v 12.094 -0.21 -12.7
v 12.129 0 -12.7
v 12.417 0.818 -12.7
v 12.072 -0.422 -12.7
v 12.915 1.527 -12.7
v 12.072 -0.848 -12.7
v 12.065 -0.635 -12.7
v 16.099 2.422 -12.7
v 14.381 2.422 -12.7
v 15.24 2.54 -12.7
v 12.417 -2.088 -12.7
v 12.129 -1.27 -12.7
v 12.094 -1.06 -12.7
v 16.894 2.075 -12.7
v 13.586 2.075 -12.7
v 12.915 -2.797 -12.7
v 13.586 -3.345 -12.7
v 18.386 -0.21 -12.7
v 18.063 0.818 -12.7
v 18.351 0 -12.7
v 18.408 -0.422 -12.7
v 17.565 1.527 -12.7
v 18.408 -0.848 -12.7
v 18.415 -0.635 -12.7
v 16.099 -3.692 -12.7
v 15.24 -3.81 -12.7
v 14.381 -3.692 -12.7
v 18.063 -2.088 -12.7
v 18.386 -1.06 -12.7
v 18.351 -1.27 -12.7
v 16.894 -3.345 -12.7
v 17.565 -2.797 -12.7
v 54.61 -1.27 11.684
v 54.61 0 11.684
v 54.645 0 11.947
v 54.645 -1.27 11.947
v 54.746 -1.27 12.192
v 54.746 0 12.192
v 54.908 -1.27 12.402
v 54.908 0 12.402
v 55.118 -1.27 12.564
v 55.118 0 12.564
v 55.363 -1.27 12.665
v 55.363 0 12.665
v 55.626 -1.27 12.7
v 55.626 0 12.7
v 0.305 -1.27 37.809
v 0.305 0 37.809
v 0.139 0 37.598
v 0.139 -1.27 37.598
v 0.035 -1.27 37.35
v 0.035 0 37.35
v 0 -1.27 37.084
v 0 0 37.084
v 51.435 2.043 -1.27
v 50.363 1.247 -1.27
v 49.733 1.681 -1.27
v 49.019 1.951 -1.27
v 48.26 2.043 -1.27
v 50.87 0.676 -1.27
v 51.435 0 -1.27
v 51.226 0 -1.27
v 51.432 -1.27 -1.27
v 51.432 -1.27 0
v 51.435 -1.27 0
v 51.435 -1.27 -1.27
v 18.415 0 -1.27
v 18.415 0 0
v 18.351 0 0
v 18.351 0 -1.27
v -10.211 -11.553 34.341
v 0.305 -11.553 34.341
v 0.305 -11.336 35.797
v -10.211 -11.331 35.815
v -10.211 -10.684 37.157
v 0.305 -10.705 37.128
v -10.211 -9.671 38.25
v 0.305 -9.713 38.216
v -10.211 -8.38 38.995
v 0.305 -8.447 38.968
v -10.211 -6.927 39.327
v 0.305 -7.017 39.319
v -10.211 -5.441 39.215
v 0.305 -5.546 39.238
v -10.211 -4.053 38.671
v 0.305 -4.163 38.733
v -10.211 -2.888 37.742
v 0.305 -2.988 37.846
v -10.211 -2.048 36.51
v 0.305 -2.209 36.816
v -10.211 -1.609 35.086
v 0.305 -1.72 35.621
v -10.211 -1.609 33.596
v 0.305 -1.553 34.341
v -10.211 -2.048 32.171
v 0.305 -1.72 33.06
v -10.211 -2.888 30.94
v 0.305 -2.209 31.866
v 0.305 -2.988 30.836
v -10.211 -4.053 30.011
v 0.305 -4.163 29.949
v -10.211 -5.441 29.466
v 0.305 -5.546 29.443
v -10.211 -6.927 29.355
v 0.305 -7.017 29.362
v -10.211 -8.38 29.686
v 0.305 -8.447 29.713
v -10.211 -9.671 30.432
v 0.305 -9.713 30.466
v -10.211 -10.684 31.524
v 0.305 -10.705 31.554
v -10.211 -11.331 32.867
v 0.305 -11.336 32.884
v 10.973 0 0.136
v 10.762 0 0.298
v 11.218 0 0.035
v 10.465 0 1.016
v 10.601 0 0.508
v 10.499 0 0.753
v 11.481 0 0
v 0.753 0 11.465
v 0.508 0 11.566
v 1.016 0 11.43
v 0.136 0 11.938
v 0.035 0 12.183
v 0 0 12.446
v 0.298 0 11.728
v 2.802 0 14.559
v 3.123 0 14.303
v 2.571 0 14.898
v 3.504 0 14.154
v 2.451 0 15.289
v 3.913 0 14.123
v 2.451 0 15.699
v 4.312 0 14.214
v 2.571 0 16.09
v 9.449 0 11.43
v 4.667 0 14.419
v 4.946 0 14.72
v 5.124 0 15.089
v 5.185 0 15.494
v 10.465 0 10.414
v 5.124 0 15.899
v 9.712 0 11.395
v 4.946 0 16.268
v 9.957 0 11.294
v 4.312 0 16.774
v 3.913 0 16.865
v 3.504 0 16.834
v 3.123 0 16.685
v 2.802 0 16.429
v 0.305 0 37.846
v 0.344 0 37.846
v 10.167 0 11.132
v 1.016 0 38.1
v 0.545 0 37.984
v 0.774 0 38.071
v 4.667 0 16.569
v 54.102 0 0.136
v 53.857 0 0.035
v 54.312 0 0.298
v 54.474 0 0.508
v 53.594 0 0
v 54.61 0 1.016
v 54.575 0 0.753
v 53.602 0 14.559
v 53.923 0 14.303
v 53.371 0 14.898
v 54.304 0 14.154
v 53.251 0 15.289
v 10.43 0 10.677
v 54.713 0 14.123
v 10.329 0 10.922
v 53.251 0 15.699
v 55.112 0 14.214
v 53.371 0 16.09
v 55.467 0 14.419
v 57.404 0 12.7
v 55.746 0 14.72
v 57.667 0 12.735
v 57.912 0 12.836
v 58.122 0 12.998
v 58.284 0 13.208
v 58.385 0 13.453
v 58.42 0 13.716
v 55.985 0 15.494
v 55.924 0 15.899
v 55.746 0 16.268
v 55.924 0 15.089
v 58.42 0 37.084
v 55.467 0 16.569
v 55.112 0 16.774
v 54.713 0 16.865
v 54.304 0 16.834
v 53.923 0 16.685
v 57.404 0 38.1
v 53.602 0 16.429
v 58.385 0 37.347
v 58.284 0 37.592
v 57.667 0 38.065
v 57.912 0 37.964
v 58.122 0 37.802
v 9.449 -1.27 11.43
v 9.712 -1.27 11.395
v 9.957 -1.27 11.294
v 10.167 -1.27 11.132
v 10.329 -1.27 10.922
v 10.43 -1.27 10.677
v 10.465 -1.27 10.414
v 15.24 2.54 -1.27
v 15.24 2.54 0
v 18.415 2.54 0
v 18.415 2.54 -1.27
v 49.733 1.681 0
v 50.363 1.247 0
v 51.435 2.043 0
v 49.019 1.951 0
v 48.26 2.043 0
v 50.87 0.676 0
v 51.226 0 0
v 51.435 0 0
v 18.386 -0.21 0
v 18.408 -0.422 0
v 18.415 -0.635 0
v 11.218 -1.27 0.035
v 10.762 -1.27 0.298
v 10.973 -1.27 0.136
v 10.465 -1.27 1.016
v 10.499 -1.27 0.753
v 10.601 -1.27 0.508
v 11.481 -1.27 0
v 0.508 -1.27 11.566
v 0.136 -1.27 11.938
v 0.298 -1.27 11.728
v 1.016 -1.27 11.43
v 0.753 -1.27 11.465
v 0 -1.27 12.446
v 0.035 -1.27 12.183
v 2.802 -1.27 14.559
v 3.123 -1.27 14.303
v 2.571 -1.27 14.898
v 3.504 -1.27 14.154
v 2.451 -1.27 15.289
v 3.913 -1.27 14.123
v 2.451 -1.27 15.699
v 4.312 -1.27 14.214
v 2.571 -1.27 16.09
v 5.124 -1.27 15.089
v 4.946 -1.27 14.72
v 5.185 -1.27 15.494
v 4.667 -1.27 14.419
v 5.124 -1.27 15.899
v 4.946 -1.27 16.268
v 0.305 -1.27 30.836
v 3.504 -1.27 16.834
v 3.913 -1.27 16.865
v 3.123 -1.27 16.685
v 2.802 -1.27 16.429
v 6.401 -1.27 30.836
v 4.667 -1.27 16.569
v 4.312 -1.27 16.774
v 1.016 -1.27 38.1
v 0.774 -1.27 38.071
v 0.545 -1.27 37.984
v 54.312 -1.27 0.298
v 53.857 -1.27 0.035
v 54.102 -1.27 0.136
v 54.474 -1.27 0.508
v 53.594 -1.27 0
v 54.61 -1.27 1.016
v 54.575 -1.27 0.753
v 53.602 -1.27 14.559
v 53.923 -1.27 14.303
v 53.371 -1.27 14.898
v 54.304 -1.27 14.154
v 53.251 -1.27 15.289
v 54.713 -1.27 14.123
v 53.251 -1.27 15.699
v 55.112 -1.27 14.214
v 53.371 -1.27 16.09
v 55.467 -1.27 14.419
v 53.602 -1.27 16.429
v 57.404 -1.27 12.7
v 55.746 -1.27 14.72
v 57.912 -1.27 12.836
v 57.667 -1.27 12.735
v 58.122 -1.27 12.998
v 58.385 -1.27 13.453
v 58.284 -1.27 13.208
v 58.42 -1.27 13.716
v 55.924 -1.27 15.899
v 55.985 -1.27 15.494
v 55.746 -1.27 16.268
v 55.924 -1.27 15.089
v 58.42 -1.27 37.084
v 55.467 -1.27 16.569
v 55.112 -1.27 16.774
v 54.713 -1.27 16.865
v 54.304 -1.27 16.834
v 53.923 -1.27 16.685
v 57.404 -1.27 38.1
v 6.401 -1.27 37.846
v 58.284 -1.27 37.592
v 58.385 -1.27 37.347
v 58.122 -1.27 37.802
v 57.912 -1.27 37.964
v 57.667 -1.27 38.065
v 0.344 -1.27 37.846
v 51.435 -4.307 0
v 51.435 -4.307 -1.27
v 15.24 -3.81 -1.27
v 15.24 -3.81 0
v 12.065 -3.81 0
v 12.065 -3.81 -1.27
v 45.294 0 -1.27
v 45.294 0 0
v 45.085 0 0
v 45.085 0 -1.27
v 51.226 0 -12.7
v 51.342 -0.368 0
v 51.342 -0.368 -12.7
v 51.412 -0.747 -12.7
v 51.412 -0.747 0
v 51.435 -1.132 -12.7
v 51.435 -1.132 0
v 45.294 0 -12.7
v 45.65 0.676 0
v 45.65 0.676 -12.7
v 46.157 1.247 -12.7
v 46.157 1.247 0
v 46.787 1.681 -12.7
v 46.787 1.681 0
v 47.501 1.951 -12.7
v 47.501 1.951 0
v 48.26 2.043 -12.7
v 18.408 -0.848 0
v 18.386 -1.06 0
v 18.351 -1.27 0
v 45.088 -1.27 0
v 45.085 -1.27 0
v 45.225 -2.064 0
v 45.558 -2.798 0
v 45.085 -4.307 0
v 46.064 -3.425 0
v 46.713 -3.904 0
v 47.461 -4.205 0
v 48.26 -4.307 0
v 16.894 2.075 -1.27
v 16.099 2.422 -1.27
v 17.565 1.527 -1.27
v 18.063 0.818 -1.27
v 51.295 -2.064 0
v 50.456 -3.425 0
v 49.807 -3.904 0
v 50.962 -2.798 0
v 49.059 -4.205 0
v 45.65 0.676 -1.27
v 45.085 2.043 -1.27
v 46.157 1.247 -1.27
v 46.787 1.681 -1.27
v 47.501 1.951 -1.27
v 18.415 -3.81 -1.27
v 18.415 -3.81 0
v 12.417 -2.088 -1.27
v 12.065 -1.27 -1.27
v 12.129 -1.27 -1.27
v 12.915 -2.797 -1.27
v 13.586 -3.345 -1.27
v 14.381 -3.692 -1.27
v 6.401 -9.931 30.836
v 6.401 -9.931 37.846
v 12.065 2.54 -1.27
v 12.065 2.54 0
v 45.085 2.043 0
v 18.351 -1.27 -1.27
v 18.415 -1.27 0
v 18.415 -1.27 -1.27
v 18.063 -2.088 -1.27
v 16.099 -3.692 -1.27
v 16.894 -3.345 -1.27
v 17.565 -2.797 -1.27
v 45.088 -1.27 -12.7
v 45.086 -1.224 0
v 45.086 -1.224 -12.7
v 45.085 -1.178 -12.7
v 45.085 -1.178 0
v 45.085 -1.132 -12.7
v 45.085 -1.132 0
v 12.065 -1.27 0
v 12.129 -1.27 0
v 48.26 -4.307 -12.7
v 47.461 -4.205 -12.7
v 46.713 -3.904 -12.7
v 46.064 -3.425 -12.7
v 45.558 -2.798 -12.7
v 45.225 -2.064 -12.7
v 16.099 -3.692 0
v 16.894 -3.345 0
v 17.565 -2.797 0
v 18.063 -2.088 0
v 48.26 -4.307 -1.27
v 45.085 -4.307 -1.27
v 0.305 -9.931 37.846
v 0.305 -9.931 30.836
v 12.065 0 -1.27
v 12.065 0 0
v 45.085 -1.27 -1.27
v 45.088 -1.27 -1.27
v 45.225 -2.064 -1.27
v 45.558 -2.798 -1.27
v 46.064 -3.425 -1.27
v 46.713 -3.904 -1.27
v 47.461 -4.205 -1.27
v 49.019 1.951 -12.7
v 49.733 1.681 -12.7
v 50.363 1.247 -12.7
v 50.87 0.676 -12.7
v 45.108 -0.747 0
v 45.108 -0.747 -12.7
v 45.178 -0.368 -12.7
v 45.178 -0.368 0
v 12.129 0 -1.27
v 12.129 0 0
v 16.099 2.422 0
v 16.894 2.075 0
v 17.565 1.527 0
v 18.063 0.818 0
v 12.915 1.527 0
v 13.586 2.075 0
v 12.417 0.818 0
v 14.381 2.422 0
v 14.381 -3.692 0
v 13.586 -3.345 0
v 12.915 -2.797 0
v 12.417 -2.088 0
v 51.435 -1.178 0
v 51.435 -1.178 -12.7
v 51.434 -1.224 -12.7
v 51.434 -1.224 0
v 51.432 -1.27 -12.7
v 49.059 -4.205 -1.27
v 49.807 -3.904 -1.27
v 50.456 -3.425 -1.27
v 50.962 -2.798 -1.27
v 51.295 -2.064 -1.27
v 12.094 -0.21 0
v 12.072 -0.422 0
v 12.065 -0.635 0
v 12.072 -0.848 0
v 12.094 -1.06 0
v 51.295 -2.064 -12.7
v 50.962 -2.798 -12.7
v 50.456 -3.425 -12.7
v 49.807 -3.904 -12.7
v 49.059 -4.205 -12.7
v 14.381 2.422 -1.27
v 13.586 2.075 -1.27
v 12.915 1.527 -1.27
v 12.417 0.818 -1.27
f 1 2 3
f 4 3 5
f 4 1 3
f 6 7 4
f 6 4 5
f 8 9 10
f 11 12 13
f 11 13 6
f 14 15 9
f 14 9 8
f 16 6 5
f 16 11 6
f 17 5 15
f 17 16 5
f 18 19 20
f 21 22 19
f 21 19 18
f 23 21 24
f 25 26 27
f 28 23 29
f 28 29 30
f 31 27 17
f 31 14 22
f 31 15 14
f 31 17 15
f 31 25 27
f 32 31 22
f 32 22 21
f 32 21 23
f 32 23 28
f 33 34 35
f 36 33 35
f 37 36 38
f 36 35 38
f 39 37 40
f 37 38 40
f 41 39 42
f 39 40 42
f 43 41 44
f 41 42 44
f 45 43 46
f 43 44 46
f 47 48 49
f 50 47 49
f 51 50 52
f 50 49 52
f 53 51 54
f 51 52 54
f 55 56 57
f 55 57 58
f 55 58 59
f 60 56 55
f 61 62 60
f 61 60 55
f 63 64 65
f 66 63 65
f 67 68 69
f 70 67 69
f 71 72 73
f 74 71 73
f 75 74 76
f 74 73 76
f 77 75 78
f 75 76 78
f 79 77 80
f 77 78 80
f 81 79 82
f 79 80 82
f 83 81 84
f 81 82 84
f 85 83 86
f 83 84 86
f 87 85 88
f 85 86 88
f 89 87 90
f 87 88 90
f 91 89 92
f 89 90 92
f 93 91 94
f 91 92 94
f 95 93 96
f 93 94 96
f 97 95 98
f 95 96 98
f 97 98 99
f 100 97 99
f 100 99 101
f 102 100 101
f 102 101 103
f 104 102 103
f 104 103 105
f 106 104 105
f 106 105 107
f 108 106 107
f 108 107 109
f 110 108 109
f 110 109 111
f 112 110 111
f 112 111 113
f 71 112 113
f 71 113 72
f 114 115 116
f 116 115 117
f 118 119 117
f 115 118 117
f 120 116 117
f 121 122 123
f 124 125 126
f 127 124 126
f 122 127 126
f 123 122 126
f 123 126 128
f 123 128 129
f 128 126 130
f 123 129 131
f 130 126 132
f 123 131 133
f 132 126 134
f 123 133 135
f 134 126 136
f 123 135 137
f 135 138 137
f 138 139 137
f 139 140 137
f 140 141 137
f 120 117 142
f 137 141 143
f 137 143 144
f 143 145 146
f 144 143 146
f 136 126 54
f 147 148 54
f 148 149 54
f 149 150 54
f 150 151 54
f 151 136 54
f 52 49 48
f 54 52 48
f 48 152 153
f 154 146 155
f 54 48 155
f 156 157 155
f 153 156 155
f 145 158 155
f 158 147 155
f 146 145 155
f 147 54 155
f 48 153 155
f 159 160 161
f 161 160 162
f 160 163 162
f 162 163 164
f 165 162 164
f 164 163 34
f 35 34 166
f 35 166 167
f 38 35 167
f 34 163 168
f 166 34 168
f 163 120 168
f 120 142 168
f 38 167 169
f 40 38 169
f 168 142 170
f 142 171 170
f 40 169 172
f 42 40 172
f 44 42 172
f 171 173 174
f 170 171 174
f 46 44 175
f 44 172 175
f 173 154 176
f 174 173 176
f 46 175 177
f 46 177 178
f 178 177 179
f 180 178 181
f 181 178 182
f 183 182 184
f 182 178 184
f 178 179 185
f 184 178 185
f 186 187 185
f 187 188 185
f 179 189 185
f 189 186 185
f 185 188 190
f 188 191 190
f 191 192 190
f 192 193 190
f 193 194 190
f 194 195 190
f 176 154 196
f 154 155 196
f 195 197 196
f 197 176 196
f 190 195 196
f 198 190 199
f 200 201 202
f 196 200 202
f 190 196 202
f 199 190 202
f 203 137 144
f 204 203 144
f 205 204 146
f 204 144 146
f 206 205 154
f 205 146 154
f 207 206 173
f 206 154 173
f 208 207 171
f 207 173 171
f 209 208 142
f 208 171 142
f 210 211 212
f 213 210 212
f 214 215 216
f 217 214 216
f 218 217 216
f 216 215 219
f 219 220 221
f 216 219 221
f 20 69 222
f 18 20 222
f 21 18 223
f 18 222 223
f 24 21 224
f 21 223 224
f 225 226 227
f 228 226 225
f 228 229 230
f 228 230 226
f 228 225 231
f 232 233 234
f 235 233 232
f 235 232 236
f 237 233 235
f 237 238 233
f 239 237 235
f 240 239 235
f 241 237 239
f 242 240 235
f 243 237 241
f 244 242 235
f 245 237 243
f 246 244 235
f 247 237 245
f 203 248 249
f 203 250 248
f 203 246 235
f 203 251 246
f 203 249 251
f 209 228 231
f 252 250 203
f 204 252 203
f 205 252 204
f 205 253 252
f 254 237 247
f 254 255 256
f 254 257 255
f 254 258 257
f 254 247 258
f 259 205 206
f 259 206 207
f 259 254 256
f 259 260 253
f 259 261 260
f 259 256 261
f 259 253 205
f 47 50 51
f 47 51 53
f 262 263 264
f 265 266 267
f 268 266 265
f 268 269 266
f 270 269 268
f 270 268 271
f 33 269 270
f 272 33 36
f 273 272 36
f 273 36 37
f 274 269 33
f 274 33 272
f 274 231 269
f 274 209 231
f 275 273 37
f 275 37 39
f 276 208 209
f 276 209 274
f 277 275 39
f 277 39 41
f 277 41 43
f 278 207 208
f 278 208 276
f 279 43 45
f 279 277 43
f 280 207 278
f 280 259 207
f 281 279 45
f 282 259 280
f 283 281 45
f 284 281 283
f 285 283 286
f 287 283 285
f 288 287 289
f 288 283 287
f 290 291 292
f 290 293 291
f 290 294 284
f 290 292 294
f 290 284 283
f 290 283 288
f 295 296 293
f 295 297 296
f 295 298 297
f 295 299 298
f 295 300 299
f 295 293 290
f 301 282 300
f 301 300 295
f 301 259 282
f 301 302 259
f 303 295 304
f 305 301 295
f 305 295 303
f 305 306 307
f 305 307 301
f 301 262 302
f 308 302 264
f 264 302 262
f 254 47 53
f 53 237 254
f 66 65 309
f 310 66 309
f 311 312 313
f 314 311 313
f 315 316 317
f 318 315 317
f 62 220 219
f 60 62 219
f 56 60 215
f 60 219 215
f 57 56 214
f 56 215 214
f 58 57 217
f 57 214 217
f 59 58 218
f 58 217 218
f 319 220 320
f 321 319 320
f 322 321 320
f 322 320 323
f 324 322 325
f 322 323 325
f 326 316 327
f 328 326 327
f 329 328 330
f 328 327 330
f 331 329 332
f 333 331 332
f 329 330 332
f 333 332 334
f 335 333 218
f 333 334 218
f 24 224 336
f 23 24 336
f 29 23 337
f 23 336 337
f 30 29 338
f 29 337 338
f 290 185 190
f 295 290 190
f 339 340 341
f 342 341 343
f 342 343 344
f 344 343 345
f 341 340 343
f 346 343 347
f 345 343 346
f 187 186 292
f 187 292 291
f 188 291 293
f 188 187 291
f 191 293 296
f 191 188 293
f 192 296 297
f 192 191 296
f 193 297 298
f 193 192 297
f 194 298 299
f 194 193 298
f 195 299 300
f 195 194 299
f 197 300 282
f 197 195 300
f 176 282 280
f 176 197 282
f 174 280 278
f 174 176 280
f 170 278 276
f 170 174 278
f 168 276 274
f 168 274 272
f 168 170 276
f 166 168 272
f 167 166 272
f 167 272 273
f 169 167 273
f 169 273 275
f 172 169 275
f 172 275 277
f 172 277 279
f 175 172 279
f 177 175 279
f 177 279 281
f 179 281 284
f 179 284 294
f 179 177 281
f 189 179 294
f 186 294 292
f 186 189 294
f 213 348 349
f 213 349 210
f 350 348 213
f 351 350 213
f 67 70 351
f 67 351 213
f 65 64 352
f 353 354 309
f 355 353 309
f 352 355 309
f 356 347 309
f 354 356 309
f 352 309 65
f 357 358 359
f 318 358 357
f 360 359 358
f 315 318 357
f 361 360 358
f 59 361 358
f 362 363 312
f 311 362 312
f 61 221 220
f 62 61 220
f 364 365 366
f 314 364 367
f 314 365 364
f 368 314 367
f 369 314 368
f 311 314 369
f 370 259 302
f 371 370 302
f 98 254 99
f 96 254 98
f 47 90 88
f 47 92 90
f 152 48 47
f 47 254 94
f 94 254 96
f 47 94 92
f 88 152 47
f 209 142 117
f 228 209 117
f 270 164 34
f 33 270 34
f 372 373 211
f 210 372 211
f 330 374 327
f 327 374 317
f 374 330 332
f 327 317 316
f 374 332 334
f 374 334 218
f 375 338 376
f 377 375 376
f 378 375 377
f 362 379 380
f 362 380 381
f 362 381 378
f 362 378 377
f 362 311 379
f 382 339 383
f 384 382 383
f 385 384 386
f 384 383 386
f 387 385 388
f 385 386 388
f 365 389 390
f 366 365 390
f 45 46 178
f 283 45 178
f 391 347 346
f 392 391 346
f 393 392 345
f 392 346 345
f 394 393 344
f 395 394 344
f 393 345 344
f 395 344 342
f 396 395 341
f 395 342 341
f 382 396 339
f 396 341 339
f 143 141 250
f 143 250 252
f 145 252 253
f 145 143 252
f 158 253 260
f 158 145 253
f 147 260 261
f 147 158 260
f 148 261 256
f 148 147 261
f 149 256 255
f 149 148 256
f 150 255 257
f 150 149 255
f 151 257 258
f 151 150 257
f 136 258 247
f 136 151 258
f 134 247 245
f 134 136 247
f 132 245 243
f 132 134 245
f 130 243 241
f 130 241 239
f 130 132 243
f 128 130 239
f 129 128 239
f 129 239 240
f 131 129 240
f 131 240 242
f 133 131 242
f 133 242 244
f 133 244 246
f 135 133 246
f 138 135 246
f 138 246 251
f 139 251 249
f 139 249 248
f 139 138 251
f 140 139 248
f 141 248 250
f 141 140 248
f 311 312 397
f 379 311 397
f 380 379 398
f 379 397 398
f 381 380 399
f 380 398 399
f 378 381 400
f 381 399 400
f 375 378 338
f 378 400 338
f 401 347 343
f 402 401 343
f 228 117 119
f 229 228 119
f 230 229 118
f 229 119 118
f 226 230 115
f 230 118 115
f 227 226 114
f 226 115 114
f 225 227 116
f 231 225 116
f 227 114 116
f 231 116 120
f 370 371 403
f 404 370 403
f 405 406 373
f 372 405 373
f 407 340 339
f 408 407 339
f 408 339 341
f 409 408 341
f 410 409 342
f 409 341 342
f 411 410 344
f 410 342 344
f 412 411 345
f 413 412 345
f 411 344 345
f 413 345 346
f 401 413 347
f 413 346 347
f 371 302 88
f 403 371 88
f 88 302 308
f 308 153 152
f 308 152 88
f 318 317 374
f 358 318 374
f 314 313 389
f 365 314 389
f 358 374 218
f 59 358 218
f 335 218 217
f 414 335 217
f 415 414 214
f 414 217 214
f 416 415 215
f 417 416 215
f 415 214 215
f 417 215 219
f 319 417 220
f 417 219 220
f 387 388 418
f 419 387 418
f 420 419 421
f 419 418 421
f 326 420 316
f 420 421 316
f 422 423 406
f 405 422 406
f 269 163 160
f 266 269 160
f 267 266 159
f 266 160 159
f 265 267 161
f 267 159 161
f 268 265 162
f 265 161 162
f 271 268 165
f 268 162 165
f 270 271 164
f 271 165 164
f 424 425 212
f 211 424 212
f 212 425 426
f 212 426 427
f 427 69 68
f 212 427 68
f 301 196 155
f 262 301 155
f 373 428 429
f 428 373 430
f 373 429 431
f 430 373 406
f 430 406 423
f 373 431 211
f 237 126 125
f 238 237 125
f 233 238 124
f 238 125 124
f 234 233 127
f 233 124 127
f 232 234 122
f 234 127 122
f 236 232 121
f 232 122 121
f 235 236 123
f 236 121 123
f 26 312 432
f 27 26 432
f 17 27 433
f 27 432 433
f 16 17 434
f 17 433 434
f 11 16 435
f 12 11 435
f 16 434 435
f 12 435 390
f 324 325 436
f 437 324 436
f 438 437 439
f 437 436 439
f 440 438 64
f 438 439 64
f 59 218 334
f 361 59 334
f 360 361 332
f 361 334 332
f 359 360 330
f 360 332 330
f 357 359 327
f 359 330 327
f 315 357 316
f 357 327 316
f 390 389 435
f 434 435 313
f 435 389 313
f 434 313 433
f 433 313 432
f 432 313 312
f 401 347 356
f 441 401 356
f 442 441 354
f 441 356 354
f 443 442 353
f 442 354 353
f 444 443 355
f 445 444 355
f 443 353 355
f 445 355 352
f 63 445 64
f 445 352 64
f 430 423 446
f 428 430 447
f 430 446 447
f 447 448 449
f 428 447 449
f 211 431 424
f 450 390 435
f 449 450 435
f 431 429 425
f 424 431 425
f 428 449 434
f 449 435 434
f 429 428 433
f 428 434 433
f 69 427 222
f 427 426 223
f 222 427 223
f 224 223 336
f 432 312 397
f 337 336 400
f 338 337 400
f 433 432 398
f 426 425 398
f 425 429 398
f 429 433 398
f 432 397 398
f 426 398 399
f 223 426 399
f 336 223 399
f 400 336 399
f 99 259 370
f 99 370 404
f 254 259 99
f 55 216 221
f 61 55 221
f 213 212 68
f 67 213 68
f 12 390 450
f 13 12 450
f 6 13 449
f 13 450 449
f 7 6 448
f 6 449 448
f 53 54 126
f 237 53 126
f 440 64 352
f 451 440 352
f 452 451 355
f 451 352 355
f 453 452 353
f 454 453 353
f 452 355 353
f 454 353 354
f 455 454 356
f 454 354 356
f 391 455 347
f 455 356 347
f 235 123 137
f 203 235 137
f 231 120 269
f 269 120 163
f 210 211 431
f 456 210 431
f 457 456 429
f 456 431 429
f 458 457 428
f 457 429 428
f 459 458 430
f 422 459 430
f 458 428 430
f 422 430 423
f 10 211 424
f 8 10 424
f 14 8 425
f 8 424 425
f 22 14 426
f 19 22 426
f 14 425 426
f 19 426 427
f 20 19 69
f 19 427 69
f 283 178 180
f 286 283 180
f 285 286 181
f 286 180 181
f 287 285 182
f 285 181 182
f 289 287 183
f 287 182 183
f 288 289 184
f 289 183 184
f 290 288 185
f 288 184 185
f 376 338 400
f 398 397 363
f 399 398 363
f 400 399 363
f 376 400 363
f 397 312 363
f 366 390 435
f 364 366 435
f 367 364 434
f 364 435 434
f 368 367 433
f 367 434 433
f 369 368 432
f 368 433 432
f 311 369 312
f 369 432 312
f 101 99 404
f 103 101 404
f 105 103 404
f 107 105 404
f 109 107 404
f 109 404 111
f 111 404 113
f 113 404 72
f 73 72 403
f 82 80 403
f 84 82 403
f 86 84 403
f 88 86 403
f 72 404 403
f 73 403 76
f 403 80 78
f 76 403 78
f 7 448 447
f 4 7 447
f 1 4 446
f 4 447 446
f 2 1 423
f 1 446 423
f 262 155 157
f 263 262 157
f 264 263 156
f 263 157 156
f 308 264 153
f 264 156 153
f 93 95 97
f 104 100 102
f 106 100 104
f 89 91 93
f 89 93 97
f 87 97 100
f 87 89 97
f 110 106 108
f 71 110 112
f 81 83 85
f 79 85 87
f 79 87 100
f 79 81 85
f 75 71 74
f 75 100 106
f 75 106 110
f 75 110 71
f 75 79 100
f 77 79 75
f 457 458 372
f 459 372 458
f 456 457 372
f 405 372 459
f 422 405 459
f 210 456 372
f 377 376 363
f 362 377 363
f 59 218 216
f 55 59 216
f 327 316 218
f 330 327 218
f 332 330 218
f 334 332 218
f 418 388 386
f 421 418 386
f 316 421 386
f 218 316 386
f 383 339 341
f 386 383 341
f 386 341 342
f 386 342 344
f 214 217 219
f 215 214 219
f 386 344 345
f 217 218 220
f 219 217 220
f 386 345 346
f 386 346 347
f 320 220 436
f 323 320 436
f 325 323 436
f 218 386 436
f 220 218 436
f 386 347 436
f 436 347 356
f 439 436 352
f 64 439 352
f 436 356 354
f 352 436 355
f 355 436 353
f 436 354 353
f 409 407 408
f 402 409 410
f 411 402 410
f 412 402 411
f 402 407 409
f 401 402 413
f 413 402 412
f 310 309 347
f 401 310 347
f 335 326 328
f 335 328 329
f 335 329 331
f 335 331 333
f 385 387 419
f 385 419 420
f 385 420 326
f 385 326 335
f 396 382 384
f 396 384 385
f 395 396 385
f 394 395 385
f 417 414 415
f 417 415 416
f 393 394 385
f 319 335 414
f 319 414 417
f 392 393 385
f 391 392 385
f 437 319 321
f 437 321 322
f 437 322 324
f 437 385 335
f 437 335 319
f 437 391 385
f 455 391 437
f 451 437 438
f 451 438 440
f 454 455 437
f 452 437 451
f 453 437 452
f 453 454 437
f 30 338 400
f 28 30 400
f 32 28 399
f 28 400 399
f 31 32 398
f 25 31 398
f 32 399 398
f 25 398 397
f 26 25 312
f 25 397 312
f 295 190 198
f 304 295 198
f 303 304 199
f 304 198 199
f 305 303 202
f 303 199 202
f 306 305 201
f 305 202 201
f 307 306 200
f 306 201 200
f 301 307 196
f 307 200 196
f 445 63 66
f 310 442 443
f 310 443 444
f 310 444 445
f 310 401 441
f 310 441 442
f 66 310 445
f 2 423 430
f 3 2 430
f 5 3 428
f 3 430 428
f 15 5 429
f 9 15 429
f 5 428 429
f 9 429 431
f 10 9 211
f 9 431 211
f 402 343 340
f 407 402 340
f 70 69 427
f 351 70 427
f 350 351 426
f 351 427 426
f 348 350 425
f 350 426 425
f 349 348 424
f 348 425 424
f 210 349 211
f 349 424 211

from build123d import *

# Parameters (mm, degrees)
F0_R     = 1.374775
F1_DEPTH = 1.27
F3_DEPTH = 1.27
F4_DEPTH = 12.7
F5_W     = 6.096
F5_H     = 7.0104
F6_DEPTH = 9.9314
F7_R     = 5
F8_DEPTH = 10.5156


with BuildPart() as f1:
    # F0 (on Front) → F1 (new body)
    with BuildSketch(Plane.XZ):
        with BuildLine():
            Line((10.464669, 10.414), (10.464669, 1.016))
            ThreePointArc((10.464669, 1.016), (10.762249, 0.29758), (11.480669, 0))
            Line((11.480669, 0), (53.594, 0))
            ThreePointArc((53.594, 0), (54.31242, 0.29758), (54.61, 1.016))
            Line((54.61, 1.016), (54.61, 11.684))
            ThreePointArc((54.61, 11.684), (54.90758, 12.40242), (55.626, 12.7))
            Line((55.626, 12.7), (57.404, 12.7))
            ThreePointArc((57.404, 12.7), (58.12242, 12.99758), (58.42, 13.716))
            Line((58.42, 13.716), (58.42, 37.084))
            ThreePointArc((58.42, 37.084), (58.12242, 37.80242), (57.404, 38.1))
            Line((57.404, 38.1), (1.016, 38.1))
            ThreePointArc((1.016, 38.1), (0.29758, 37.80242), (0, 37.084))
            Line((0, 37.084), (0, 12.446))
            ThreePointArc((0, 12.446), (0.29758, 11.72758), (1.016, 11.43))
            Line((1.016, 11.43), (9.448669, 11.43))
            ThreePointArc((9.448669, 11.43), (10.16709, 11.13242), (10.464669, 10.414))
        make_face()
        with Locations((3.81, 15.494)):
            Circle(F0_R, mode=Mode.SUBTRACT)
        with Locations((54.61, 15.494)):
            Circle(F0_R, mode=Mode.SUBTRACT)
    extrude(amount=F1_DEPTH)

    # F5 (on face) → F6 (join)
    with BuildSketch(Plane(origin=(0, 0, 0), x_dir=(-1, 0, 0), z_dir=(0, 1, 0))):
        with Locations((-3.352669, 34.340801)):
            Rectangle(F5_W, F5_H)
    extrude(amount=-F6_DEPTH)

    # F7 (on face) → F8 (join)
    with BuildSketch(Plane(origin=(0.304669, 0, 0), x_dir=(0, -1, 0), z_dir=(-1, 0, 0))):
        with Locations((6.5532, 34.340801)):
            Circle(F7_R)
    extrude(amount=F8_DEPTH)


with BuildPart() as f3:
    # F2 (on face) → F3 (new body)
    with BuildSketch(Plane(origin=(0, 0, 0), x_dir=(1, 0, 0), z_dir=(0, 0, -1))):
        with BuildLine():
            Line((18.350852, 1.27), (18.415, 1.27))
            Line((18.415, 1.27), (18.415, 3.81))
            Line((18.415, 3.81), (15.24, 3.81))
            ThreePointArc((15.24, 3.81), (17.248046, 3.094344), (18.350852, 1.27))
        make_face()
        with BuildLine():
            Line((12.065, 3.81), (12.065, 1.27))
            Line((12.065, 1.27), (12.129148, 1.27))
            ThreePointArc((12.129148, 1.27), (13.231954, 3.094344), (15.24, 3.81))
            Line((15.24, 3.81), (12.065, 3.81))
        make_face()
        with BuildLine():
            Line((12.065, -2.54), (15.24, -2.54))
            ThreePointArc((15.24, -2.54), (13.231954, -1.824344), (12.129148, 0))
            Line((12.129148, 0), (12.065, 0))
            Line((12.065, 0), (12.065, -2.54))
        make_face()
        with BuildLine():
            Line((15.24, -2.54), (18.415, -2.54))
            Line((18.415, -2.54), (18.415, 0))
            Line((18.415, 0), (18.350852, 0))
            ThreePointArc((18.350852, 0), (17.248046, -1.824344), (15.24, -2.54))
        make_face()
        with BuildLine():
            Line((51.435, 4.306842), (48.26, 4.306842))
            ThreePointArc((48.26, 4.306842), (50.455675, 3.425232), (51.431993, 1.27))
            Line((51.431993, 1.27), (51.435, 1.27))
            Line((51.435, 1.27), (51.435, 4.306842))
        make_face()
        with BuildLine():
            Line((45.085, 4.306842), (45.085, 1.27))
            Line((45.085, 1.27), (45.088007, 1.27))
            ThreePointArc((45.088007, 1.27), (46.064325, 3.425232), (48.26, 4.306842))
            Line((48.26, 4.306842), (45.085, 4.306842))
        make_face()
        with BuildLine():
            Line((45.293595, 0), (45.085, 0))
            Line((45.085, 0), (45.085, -2.043158))
            Line((45.085, -2.043158), (48.26, -2.043158))
            ThreePointArc((48.26, -2.043158), (46.459024, -1.482945), (45.293595, 0))
        make_face()
        with BuildLine():
            ThreePointArc((51.226405, 0), (50.060976, -1.482945), (48.26, -2.043158))
            Line((48.26, -2.043158), (51.435, -2.043158))
            Line((51.435, -2.043158), (51.435, 0))
            Line((51.435, 0), (51.226405, 0))
        make_face()
    extrude(amount=F3_DEPTH)


with BuildPart() as f4:
    # F2 (on face) → F4 (new body)
    with BuildSketch(Plane(origin=(0, 0, 0), x_dir=(1, 0, 0), z_dir=(0, 0, -1))):
        with BuildLine():
            Line((12.129148, 1.27), (18.350852, 1.27))
            ThreePointArc((18.350852, 1.27), (17.248046, 3.094344), (15.24, 3.81))
            ThreePointArc((15.24, 3.81), (13.231954, 3.094344), (12.129148, 1.27))
        make_face()
        with BuildLine():
            ThreePointArc((12.065, 0.635), (12.081078, 0.315884), (12.129148, 0))
            Line((12.129148, 0), (18.350852, 0))
            ThreePointArc((18.350852, 0), (18.398922, 0.315884), (18.415, 0.635))
            ThreePointArc((18.415, 0.635), (18.398922, 0.954116), (18.350852, 1.27))
            Line((18.350852, 1.27), (12.129148, 1.27))
            ThreePointArc((12.129148, 1.27), (12.081078, 0.954116), (12.065, 0.635))
        make_face()
        with BuildLine():
            ThreePointArc((12.129148, 0), (13.231954, -1.824344), (15.24, -2.54))
            ThreePointArc((15.24, -2.54), (17.248046, -1.824344), (18.350852, 0))
            Line((18.350852, 0), (12.129148, 0))
        make_face()
        with BuildLine():
            ThreePointArc((48.26, 4.306842), (46.064325, 3.425232), (45.088007, 1.27))
            Line((45.088007, 1.27), (51.431993, 1.27))
            ThreePointArc((51.431993, 1.27), (50.455675, 3.425232), (48.26, 4.306842))
        make_face()
        with BuildLine():
            ThreePointArc((45.088007, 1.27), (45.085752, 1.200937), (45.085, 1.131842))
            ThreePointArc((45.085, 1.131842), (45.137584, 0.55639), (45.293595, 0))
            Line((45.293595, 0), (51.226405, 0))
            ThreePointArc((51.226405, 0), (51.382416, 0.55639), (51.435, 1.131842))
            ThreePointArc((51.435, 1.131842), (51.434248, 1.200937), (51.431993, 1.27))
            Line((51.431993, 1.27), (45.088007, 1.27))
        make_face()
        with BuildLine():
            Line((51.226405, 0), (45.293595, 0))
            ThreePointArc((45.293595, 0), (46.459024, -1.482945), (48.26, -2.043158))
            ThreePointArc((48.26, -2.043158), (50.060976, -1.482945), (51.226405, 0))
        make_face()
    extrude(amount=F4_DEPTH)


solid = Compound([f1.part, f3.part, f4.part])
